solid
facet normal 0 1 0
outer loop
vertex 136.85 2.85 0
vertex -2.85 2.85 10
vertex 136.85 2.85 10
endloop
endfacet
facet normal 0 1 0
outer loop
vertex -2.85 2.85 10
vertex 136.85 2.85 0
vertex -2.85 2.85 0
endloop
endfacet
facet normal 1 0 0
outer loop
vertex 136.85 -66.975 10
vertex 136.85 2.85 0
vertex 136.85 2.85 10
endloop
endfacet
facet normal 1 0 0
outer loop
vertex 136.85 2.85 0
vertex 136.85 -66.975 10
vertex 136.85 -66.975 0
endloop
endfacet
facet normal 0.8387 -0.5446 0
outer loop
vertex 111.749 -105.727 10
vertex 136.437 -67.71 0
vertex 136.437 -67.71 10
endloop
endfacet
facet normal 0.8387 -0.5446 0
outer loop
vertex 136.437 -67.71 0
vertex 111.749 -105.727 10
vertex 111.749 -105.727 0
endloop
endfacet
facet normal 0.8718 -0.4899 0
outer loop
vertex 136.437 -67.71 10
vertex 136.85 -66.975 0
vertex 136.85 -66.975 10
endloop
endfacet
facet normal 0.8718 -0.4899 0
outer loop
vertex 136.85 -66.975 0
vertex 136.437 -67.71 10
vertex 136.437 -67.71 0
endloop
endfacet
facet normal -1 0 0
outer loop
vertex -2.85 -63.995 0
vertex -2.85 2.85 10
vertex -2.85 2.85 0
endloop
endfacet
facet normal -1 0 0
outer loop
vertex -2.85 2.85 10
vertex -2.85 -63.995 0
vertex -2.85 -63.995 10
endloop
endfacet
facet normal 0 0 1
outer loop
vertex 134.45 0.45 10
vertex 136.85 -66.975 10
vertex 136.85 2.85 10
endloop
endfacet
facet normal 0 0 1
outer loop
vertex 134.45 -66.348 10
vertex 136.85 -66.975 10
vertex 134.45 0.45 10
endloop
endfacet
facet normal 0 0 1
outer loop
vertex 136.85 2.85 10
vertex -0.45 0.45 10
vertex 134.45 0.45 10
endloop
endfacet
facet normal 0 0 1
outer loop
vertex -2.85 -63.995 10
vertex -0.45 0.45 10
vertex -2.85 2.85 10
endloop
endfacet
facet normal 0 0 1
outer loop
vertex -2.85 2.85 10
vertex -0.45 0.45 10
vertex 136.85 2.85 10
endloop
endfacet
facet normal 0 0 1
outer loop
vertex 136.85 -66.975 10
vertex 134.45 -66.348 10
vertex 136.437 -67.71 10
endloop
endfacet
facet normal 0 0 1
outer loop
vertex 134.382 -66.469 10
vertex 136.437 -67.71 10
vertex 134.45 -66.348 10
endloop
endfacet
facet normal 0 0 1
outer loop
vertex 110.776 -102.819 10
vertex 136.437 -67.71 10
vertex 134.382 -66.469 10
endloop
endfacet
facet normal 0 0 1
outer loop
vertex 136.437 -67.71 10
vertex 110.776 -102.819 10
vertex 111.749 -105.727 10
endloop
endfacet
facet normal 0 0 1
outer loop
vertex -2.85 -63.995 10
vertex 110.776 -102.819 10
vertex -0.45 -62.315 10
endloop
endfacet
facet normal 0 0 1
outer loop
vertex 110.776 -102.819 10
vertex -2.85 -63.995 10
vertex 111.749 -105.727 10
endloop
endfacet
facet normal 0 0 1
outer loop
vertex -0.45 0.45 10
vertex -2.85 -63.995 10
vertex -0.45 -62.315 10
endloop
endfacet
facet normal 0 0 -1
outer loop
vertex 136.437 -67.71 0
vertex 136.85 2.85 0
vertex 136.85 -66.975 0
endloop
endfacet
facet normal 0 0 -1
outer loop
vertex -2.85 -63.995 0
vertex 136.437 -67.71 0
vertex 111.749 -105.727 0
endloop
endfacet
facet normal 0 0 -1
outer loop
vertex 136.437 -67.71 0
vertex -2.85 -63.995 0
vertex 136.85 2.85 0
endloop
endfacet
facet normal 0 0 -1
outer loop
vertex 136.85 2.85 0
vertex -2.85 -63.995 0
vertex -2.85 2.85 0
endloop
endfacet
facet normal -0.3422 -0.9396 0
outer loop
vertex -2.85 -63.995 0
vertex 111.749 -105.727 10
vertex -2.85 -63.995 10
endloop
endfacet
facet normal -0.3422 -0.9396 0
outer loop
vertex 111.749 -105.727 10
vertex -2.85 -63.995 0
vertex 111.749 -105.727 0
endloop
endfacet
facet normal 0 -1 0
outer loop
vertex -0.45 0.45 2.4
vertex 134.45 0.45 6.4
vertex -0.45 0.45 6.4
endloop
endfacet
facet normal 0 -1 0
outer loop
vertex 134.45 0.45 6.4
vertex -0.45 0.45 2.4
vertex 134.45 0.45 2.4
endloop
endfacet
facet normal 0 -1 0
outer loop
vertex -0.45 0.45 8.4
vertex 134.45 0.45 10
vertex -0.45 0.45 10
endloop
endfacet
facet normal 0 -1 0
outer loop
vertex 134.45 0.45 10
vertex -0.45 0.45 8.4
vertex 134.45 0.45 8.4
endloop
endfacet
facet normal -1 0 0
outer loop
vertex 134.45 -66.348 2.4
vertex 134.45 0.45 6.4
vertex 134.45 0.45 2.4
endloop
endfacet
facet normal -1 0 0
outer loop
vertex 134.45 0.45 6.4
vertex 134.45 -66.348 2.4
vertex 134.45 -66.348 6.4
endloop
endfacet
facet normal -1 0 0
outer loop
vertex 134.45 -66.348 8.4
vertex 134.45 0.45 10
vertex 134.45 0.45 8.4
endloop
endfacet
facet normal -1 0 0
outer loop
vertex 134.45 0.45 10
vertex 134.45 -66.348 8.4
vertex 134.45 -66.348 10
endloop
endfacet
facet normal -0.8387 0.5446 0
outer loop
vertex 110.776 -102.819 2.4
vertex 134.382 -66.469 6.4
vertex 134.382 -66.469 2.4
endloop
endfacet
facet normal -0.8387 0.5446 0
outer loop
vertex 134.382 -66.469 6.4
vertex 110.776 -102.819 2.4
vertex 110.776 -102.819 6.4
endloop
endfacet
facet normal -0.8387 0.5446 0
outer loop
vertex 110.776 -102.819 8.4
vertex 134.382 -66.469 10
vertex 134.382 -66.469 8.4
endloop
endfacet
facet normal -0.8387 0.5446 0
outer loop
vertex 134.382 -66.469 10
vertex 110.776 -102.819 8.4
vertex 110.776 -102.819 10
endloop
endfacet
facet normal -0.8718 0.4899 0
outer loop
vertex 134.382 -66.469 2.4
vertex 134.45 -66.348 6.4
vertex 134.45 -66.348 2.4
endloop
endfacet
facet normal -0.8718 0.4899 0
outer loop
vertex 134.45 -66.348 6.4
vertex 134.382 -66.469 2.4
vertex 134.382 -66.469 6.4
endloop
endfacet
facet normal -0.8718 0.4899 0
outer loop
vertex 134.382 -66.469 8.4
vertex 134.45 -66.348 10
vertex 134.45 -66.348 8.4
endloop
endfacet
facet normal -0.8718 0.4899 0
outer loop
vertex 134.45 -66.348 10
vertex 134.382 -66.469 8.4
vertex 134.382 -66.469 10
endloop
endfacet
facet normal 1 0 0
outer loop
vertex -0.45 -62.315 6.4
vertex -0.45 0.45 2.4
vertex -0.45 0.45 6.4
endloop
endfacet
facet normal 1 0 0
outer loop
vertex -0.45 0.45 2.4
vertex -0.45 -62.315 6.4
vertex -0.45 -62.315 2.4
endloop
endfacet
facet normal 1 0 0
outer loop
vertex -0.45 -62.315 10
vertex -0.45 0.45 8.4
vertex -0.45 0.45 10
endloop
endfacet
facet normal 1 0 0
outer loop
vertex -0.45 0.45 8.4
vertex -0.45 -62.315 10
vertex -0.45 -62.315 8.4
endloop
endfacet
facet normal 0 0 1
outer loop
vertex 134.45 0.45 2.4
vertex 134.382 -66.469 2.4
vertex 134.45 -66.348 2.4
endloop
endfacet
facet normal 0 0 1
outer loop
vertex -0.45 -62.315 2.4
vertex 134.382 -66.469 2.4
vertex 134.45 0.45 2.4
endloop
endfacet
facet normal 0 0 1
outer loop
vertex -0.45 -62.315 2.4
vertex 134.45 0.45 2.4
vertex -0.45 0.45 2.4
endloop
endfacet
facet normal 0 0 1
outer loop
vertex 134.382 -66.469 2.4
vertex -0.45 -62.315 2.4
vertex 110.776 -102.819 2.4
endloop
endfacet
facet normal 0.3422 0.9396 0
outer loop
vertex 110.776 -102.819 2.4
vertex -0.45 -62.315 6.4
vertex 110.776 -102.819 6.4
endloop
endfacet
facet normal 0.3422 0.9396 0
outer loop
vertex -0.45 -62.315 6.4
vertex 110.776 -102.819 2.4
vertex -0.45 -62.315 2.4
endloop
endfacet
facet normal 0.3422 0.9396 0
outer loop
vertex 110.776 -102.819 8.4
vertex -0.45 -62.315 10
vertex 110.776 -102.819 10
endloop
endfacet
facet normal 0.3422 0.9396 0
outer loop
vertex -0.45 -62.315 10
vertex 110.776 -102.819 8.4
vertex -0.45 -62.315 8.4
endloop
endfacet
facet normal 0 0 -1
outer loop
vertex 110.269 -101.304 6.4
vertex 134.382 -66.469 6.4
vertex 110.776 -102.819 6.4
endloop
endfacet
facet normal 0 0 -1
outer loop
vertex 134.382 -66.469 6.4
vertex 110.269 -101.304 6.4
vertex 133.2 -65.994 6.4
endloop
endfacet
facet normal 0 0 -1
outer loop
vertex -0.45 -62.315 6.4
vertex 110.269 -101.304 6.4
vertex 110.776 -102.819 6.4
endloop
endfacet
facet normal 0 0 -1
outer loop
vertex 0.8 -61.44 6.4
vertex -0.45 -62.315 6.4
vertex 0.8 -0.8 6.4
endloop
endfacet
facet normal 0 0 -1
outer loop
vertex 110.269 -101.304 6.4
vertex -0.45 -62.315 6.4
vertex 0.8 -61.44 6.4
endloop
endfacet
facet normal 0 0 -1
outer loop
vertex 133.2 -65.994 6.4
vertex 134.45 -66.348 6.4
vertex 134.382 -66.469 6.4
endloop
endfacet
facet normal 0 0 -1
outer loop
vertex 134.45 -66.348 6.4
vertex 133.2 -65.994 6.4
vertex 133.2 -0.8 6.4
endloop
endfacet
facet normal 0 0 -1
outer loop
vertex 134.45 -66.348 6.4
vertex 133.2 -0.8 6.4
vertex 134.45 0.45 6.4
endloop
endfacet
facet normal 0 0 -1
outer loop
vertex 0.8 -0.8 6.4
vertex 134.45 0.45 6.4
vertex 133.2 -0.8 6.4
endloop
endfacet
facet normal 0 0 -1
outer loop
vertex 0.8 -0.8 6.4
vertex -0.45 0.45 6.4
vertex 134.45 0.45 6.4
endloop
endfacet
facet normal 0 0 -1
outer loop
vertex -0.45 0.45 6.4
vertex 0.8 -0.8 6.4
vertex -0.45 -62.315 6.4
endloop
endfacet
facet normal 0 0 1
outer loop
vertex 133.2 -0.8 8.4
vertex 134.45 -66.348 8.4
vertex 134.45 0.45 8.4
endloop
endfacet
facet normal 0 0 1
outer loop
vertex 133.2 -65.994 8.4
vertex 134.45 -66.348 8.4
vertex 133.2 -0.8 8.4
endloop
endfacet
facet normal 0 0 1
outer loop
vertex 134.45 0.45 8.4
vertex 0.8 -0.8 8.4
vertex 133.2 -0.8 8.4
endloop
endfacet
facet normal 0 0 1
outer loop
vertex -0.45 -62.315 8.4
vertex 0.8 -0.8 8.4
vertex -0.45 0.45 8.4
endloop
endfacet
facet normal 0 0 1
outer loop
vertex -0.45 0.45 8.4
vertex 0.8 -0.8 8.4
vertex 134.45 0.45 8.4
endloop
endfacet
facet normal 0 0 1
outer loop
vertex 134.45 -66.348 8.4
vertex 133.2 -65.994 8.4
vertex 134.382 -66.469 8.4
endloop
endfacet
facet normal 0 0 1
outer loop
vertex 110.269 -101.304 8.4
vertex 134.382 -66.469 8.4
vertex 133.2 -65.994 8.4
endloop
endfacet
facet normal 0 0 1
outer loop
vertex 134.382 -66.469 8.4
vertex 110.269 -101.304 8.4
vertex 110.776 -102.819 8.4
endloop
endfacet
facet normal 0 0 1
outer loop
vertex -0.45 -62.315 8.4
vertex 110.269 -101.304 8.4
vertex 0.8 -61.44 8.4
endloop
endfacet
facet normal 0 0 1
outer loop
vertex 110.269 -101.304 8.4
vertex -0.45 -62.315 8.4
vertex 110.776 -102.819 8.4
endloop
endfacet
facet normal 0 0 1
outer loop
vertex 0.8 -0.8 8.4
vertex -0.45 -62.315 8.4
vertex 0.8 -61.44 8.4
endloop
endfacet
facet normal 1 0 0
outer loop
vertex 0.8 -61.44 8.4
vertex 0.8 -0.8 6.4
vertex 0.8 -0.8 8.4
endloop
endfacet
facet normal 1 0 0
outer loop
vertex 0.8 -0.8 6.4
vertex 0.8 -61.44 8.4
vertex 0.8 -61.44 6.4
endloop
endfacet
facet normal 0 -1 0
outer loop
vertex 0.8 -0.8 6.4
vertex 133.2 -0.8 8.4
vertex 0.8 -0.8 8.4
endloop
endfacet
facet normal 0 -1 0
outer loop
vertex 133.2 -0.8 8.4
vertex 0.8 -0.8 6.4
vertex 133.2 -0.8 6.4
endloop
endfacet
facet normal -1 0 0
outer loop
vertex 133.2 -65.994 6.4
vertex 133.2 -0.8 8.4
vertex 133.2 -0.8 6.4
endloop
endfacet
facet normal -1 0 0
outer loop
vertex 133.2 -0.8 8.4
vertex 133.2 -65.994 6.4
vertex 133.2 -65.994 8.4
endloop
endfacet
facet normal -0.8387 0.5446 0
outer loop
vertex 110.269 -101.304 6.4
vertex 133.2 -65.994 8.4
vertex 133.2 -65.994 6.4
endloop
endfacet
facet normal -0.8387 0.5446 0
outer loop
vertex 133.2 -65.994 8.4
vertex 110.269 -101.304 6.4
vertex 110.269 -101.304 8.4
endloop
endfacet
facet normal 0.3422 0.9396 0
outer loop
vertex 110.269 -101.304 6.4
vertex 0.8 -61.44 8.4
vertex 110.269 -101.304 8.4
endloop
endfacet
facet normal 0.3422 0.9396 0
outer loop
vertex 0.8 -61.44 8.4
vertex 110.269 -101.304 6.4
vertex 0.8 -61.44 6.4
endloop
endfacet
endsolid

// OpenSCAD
// Pickett46 open tray fit prototype, dimensions in millimeters.
// PCB outline from hardware/left.kicad_pcb.
// The right PCB perimeter is its reflection. The outlines share a 134 mm width.
side = "left"; // [left, right]
board_clearance = 0.45;
wall_thickness = 2.4;
floor_thickness = 2.4;
under_board_height = 6;
board_thickness = 1.6;
ledge_overlap = 0.8;
ledge_height = 2;

pcb = [
    [0, 0],
    [134, 0],
    [134, -66.23],
    [133.996771, -66.235768],
    [110.593632, -102.273443],
    [0, -62]
];

module perimeter(distance) {
    offset(delta = distance) polygon(pcb);
}

module tray() {
    seat_z = floor_thickness + under_board_height;

    difference() {
        linear_extrude(height = seat_z + board_thickness)
            perimeter(board_clearance + wall_thickness);

        // Keep the central cavity clear for sockets and solder joints.
        translate([0, 0, floor_thickness])
            linear_extrude(height = seat_z + board_thickness)
                perimeter(board_clearance);
    }

    translate([0, 0, seat_z - ledge_height])
        linear_extrude(height = ledge_height)
            difference() {
                // Overlap the wall to give the ledge a solid connection.
                perimeter(board_clearance + wall_thickness / 2);
                perimeter(-ledge_overlap);
            }
}

if (side == "right")
    translate([134, 0, 0]) mirror([1, 0, 0]) tray();
else
    tray();
